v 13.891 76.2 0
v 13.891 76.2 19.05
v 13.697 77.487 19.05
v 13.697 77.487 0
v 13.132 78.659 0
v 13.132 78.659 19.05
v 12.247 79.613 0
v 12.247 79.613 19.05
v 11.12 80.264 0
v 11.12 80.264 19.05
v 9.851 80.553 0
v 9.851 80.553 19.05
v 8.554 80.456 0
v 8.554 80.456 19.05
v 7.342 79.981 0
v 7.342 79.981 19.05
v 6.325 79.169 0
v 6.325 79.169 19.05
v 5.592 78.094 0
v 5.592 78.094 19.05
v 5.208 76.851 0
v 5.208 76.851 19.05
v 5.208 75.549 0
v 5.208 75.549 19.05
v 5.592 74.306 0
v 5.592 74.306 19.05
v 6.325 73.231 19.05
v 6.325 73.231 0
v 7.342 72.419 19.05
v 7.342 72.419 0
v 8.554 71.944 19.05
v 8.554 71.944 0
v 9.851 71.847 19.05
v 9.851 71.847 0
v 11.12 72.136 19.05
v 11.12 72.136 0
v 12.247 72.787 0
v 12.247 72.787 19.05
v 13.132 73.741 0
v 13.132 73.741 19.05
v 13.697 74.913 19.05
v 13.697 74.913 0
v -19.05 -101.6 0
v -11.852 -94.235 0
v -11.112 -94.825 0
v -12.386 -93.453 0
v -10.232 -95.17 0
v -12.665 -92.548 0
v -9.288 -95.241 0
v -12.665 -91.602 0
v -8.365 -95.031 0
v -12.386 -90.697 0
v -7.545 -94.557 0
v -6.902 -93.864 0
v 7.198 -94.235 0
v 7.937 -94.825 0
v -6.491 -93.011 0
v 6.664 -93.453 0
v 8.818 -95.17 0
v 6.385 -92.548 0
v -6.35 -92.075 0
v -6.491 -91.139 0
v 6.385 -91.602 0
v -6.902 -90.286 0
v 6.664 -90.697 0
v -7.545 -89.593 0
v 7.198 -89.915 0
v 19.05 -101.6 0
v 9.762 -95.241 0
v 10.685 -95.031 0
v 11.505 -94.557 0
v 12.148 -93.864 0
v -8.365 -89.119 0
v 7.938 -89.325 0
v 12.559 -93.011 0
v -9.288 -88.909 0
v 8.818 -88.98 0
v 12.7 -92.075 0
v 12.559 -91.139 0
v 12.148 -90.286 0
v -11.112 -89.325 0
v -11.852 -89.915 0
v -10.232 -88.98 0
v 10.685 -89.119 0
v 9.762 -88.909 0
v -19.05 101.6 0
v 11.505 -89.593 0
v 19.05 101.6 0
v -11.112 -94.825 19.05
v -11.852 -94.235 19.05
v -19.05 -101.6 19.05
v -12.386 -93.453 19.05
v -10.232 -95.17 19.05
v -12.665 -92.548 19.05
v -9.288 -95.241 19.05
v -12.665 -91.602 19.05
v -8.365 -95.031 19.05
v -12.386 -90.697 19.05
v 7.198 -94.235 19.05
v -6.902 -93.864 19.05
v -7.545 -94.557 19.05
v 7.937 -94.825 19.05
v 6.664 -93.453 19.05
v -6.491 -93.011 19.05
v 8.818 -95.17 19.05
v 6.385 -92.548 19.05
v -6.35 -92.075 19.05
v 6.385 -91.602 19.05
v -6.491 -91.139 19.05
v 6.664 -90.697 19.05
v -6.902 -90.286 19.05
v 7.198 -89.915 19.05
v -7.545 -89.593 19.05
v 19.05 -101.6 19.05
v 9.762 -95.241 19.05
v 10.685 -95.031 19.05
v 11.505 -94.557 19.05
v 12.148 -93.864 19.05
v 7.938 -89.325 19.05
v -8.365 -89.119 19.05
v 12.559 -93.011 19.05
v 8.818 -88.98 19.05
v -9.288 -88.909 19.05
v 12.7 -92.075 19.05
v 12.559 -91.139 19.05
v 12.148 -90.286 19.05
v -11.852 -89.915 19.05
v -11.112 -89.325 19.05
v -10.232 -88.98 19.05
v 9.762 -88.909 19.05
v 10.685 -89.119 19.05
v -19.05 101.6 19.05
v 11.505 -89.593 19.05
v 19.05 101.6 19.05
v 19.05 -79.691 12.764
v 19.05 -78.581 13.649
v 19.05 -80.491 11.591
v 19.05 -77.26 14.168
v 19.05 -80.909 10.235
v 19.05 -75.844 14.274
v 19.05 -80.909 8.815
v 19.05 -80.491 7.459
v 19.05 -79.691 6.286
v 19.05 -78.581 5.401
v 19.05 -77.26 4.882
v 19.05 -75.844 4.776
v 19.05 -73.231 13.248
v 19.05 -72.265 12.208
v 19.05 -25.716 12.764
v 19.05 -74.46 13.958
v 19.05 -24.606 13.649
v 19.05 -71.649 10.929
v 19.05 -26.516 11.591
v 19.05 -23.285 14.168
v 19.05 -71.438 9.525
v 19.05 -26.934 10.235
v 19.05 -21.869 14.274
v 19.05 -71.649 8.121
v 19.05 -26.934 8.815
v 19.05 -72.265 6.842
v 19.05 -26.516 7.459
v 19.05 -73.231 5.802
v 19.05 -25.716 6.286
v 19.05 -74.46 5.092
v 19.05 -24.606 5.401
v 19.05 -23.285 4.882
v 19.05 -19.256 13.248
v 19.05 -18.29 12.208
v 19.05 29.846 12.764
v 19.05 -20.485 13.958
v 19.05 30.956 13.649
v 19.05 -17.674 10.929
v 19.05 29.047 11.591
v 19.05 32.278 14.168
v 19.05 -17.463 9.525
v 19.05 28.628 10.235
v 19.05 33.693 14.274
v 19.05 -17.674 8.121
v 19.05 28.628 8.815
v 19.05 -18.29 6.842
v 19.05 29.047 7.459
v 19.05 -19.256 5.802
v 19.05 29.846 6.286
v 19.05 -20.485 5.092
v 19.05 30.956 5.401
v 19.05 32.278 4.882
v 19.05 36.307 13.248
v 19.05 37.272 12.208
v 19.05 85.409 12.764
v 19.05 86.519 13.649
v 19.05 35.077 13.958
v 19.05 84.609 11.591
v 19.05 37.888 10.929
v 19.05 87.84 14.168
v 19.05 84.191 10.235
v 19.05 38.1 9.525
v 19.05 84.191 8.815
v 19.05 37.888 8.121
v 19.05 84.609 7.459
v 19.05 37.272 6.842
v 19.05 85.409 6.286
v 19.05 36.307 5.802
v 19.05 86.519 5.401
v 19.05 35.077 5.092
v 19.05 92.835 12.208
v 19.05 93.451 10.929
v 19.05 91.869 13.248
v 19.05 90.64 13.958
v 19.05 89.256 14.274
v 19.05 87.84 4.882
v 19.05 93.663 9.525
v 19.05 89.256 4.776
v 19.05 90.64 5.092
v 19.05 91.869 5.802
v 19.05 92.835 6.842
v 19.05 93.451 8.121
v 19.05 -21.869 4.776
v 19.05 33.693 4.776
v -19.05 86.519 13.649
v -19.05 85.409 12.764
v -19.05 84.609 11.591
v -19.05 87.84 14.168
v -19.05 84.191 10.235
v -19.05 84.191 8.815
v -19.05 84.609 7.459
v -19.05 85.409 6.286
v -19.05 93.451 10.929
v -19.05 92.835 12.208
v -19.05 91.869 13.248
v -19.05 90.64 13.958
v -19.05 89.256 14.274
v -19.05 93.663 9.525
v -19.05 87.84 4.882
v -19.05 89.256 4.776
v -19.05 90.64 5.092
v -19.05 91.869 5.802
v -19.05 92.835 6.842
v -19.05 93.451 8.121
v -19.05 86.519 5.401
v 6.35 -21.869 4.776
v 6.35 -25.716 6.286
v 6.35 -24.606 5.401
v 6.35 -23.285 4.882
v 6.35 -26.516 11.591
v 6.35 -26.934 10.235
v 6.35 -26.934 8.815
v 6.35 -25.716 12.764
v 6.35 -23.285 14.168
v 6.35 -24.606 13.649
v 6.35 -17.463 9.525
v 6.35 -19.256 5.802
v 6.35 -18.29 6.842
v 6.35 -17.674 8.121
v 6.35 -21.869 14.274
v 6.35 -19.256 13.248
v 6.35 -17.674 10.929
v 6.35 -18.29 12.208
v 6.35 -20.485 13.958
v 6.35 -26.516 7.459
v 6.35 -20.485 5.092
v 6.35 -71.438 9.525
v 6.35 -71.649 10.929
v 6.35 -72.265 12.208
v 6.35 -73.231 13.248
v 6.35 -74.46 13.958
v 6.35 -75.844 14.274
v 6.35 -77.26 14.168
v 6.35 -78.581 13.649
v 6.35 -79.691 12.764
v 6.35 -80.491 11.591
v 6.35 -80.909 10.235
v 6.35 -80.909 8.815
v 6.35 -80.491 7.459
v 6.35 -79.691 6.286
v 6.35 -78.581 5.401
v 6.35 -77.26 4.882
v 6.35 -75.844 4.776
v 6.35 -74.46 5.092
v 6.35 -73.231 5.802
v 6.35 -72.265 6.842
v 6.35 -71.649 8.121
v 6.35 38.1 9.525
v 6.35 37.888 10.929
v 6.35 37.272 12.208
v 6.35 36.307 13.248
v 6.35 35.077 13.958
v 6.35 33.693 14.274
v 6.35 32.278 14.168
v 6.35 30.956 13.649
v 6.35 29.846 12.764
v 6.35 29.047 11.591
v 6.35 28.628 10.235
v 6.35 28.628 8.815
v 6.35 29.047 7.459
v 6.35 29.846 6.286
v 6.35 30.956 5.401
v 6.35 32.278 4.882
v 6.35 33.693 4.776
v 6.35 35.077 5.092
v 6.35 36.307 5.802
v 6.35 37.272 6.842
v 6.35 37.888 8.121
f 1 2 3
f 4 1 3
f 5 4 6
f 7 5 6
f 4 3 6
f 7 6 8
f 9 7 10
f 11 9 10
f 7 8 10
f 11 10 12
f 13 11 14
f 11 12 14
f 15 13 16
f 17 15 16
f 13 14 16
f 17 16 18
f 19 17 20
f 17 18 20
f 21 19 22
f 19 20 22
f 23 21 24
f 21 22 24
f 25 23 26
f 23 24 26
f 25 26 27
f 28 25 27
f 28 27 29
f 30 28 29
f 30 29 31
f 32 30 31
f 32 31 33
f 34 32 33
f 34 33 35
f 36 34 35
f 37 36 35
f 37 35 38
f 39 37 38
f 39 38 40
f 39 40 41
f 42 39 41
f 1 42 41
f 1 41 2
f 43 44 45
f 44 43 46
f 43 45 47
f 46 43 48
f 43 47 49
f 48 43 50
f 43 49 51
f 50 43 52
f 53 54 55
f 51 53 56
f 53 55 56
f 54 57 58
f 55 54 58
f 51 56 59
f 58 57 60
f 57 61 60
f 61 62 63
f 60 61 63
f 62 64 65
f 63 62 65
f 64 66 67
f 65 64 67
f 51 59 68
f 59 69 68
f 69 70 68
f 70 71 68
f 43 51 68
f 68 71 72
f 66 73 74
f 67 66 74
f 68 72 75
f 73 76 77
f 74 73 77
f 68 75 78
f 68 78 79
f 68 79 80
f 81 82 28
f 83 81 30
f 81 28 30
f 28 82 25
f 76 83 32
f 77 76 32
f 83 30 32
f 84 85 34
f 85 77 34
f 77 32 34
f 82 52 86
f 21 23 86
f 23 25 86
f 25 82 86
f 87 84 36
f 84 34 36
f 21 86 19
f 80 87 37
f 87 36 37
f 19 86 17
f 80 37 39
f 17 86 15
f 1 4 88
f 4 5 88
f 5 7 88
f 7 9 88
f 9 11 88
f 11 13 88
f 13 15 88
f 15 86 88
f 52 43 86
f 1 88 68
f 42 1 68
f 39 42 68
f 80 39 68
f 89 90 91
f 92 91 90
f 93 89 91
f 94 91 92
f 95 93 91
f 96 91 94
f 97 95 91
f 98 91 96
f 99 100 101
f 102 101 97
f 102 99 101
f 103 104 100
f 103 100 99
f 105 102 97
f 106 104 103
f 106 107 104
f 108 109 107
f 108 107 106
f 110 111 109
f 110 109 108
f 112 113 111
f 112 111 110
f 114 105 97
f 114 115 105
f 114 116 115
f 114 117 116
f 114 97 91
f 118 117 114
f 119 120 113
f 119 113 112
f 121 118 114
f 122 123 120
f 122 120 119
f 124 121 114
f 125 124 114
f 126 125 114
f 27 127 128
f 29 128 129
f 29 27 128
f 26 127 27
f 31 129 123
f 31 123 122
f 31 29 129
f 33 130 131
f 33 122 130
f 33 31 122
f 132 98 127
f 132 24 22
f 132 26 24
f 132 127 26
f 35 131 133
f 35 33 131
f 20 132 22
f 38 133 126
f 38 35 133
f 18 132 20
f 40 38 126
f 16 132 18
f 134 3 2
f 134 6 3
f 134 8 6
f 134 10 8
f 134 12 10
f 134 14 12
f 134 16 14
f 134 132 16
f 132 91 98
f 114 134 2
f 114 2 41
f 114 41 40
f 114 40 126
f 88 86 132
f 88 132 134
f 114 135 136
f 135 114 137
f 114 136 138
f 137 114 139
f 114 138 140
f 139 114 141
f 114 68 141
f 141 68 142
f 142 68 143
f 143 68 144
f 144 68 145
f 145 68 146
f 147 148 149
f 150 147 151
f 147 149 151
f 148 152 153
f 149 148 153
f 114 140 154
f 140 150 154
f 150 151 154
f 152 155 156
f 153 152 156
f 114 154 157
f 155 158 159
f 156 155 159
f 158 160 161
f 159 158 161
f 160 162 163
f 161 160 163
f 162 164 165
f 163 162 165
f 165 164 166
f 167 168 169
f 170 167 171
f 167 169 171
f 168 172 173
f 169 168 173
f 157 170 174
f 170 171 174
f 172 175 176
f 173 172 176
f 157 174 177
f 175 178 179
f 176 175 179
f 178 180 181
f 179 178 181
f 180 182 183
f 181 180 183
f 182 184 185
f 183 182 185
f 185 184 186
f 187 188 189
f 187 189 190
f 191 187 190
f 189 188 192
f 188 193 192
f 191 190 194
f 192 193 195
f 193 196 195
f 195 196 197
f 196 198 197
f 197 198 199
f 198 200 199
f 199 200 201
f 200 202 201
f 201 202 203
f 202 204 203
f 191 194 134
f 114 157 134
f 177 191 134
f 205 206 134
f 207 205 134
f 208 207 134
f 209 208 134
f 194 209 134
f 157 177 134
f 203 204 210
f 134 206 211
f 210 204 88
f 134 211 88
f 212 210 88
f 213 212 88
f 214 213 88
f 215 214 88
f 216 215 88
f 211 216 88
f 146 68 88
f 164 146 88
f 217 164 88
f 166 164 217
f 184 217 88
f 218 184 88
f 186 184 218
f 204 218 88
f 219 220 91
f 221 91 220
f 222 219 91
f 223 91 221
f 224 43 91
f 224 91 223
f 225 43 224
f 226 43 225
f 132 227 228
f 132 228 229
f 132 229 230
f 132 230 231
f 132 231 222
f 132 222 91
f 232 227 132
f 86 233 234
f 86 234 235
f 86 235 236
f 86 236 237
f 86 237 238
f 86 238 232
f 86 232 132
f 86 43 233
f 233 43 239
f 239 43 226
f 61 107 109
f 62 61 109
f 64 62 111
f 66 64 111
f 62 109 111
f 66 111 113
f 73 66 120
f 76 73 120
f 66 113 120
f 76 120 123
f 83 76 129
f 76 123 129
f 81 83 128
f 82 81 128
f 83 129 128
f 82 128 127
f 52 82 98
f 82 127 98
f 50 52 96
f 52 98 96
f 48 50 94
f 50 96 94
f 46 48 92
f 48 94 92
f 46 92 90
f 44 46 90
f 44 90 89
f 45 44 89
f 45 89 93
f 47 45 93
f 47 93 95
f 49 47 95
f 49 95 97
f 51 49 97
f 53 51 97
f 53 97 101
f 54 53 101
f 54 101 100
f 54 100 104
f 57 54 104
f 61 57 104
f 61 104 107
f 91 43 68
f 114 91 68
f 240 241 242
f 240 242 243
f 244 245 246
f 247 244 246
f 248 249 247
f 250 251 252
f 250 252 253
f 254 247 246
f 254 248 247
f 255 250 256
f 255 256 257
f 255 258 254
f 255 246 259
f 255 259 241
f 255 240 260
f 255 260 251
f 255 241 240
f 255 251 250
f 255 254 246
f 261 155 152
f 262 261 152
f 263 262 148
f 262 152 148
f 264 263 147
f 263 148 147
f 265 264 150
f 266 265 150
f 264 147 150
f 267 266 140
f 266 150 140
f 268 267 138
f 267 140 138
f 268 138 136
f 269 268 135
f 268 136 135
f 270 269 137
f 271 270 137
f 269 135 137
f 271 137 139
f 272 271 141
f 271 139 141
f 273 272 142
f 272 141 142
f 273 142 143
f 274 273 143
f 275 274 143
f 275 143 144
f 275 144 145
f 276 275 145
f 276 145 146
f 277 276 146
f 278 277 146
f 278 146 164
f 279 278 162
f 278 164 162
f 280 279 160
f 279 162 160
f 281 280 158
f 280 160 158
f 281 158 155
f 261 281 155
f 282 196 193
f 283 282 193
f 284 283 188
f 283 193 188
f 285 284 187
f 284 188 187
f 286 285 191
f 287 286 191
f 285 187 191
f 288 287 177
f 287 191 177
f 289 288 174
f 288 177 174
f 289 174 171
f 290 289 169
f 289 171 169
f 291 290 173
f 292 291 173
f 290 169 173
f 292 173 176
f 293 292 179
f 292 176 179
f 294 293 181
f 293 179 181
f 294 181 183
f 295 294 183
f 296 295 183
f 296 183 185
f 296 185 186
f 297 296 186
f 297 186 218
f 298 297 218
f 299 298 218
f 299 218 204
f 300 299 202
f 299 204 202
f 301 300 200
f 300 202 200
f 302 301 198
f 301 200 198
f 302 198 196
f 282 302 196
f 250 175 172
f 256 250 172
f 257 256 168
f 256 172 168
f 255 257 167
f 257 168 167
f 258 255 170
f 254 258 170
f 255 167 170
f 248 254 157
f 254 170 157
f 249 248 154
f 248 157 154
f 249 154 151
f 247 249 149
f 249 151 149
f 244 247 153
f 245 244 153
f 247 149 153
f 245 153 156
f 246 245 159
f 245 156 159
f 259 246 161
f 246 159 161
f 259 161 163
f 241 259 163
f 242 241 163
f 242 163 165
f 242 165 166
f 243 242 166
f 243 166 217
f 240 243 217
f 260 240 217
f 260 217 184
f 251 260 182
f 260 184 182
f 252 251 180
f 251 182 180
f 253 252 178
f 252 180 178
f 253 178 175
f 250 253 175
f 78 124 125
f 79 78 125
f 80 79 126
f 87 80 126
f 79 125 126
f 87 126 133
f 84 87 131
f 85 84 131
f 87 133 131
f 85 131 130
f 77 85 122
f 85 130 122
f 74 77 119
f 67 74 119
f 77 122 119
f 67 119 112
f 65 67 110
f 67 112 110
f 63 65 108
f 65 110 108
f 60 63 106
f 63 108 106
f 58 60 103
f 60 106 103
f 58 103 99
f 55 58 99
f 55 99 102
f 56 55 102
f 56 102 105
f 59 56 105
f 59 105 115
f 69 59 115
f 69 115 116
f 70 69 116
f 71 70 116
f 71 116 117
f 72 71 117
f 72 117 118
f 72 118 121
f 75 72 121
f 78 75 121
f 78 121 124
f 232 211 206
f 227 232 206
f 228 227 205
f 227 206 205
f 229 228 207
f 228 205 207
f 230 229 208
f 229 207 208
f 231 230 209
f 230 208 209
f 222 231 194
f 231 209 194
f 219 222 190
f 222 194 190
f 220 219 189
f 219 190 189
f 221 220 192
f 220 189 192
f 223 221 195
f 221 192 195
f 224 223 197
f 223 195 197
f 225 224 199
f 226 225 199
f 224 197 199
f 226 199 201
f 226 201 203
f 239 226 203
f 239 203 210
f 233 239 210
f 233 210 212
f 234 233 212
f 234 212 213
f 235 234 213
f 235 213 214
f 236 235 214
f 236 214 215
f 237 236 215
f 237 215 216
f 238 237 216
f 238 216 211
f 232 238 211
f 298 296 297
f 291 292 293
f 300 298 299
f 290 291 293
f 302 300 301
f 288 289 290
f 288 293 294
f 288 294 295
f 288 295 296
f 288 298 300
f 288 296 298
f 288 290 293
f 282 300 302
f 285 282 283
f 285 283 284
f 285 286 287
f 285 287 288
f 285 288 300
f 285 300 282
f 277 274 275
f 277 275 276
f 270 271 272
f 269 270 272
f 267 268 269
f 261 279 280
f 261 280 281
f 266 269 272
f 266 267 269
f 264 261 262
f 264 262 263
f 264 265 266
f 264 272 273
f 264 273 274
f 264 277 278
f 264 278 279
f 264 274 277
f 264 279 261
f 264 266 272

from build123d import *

# Parameters (mm, degrees)
F0_W     = 38.1
F0_H     = 203.2
F1_DEPTH = 19.05
F2_R     = 4.7625
F3_DEPTH = 38.101
F4_R     = 3.175
F5_DEPTH = 19.051
F6_R     = 4.365625
F7_DEPTH = 19.051
F8_DEPTH = 12.7


with BuildPart() as f1:
    # F0 (on Top) → F1 (new body)
    with BuildSketch(Plane.XY):
        Rectangle(F0_W, F0_H)
    extrude(amount=F1_DEPTH)

    # F2 (on face) → F3 (cut, through all)
    with BuildSketch(Plane.YZ.offset(19.05)):
        with Locations((88.9, 9.525)):
            Circle(F2_R)
    extrude(amount=-F3_DEPTH, mode=Mode.SUBTRACT)

    # F4 (on face) → F5 (cut, through all)
    with BuildSketch(Plane.XY.offset(19.05)):
        with Locations((-9.525, -92.075)):
            Circle(F4_R)
        with Locations((9.525, -92.075)):
            Circle(F4_R)
    extrude(amount=-F5_DEPTH, mode=Mode.SUBTRACT)

    # F6 (on face) → F7 (cut, through all)
    with BuildSketch(Plane.XY.offset(19.05)):
        with Locations((9.525, 76.2)):
            Circle(F6_R)
    extrude(amount=-F7_DEPTH, mode=Mode.SUBTRACT)

    # F2 (on face) → F8 (cut)
    with BuildSketch(Plane.YZ.offset(19.05)):
        with Locations((33.3375, 9.525)):
            Circle(F2_R)
        with Locations((-22.225, 9.525)):
            Circle(F2_R)
        with Locations((-76.2, 9.525)):
            Circle(F2_R)
    extrude(amount=-F8_DEPTH, mode=Mode.SUBTRACT)


solid = f1.part
